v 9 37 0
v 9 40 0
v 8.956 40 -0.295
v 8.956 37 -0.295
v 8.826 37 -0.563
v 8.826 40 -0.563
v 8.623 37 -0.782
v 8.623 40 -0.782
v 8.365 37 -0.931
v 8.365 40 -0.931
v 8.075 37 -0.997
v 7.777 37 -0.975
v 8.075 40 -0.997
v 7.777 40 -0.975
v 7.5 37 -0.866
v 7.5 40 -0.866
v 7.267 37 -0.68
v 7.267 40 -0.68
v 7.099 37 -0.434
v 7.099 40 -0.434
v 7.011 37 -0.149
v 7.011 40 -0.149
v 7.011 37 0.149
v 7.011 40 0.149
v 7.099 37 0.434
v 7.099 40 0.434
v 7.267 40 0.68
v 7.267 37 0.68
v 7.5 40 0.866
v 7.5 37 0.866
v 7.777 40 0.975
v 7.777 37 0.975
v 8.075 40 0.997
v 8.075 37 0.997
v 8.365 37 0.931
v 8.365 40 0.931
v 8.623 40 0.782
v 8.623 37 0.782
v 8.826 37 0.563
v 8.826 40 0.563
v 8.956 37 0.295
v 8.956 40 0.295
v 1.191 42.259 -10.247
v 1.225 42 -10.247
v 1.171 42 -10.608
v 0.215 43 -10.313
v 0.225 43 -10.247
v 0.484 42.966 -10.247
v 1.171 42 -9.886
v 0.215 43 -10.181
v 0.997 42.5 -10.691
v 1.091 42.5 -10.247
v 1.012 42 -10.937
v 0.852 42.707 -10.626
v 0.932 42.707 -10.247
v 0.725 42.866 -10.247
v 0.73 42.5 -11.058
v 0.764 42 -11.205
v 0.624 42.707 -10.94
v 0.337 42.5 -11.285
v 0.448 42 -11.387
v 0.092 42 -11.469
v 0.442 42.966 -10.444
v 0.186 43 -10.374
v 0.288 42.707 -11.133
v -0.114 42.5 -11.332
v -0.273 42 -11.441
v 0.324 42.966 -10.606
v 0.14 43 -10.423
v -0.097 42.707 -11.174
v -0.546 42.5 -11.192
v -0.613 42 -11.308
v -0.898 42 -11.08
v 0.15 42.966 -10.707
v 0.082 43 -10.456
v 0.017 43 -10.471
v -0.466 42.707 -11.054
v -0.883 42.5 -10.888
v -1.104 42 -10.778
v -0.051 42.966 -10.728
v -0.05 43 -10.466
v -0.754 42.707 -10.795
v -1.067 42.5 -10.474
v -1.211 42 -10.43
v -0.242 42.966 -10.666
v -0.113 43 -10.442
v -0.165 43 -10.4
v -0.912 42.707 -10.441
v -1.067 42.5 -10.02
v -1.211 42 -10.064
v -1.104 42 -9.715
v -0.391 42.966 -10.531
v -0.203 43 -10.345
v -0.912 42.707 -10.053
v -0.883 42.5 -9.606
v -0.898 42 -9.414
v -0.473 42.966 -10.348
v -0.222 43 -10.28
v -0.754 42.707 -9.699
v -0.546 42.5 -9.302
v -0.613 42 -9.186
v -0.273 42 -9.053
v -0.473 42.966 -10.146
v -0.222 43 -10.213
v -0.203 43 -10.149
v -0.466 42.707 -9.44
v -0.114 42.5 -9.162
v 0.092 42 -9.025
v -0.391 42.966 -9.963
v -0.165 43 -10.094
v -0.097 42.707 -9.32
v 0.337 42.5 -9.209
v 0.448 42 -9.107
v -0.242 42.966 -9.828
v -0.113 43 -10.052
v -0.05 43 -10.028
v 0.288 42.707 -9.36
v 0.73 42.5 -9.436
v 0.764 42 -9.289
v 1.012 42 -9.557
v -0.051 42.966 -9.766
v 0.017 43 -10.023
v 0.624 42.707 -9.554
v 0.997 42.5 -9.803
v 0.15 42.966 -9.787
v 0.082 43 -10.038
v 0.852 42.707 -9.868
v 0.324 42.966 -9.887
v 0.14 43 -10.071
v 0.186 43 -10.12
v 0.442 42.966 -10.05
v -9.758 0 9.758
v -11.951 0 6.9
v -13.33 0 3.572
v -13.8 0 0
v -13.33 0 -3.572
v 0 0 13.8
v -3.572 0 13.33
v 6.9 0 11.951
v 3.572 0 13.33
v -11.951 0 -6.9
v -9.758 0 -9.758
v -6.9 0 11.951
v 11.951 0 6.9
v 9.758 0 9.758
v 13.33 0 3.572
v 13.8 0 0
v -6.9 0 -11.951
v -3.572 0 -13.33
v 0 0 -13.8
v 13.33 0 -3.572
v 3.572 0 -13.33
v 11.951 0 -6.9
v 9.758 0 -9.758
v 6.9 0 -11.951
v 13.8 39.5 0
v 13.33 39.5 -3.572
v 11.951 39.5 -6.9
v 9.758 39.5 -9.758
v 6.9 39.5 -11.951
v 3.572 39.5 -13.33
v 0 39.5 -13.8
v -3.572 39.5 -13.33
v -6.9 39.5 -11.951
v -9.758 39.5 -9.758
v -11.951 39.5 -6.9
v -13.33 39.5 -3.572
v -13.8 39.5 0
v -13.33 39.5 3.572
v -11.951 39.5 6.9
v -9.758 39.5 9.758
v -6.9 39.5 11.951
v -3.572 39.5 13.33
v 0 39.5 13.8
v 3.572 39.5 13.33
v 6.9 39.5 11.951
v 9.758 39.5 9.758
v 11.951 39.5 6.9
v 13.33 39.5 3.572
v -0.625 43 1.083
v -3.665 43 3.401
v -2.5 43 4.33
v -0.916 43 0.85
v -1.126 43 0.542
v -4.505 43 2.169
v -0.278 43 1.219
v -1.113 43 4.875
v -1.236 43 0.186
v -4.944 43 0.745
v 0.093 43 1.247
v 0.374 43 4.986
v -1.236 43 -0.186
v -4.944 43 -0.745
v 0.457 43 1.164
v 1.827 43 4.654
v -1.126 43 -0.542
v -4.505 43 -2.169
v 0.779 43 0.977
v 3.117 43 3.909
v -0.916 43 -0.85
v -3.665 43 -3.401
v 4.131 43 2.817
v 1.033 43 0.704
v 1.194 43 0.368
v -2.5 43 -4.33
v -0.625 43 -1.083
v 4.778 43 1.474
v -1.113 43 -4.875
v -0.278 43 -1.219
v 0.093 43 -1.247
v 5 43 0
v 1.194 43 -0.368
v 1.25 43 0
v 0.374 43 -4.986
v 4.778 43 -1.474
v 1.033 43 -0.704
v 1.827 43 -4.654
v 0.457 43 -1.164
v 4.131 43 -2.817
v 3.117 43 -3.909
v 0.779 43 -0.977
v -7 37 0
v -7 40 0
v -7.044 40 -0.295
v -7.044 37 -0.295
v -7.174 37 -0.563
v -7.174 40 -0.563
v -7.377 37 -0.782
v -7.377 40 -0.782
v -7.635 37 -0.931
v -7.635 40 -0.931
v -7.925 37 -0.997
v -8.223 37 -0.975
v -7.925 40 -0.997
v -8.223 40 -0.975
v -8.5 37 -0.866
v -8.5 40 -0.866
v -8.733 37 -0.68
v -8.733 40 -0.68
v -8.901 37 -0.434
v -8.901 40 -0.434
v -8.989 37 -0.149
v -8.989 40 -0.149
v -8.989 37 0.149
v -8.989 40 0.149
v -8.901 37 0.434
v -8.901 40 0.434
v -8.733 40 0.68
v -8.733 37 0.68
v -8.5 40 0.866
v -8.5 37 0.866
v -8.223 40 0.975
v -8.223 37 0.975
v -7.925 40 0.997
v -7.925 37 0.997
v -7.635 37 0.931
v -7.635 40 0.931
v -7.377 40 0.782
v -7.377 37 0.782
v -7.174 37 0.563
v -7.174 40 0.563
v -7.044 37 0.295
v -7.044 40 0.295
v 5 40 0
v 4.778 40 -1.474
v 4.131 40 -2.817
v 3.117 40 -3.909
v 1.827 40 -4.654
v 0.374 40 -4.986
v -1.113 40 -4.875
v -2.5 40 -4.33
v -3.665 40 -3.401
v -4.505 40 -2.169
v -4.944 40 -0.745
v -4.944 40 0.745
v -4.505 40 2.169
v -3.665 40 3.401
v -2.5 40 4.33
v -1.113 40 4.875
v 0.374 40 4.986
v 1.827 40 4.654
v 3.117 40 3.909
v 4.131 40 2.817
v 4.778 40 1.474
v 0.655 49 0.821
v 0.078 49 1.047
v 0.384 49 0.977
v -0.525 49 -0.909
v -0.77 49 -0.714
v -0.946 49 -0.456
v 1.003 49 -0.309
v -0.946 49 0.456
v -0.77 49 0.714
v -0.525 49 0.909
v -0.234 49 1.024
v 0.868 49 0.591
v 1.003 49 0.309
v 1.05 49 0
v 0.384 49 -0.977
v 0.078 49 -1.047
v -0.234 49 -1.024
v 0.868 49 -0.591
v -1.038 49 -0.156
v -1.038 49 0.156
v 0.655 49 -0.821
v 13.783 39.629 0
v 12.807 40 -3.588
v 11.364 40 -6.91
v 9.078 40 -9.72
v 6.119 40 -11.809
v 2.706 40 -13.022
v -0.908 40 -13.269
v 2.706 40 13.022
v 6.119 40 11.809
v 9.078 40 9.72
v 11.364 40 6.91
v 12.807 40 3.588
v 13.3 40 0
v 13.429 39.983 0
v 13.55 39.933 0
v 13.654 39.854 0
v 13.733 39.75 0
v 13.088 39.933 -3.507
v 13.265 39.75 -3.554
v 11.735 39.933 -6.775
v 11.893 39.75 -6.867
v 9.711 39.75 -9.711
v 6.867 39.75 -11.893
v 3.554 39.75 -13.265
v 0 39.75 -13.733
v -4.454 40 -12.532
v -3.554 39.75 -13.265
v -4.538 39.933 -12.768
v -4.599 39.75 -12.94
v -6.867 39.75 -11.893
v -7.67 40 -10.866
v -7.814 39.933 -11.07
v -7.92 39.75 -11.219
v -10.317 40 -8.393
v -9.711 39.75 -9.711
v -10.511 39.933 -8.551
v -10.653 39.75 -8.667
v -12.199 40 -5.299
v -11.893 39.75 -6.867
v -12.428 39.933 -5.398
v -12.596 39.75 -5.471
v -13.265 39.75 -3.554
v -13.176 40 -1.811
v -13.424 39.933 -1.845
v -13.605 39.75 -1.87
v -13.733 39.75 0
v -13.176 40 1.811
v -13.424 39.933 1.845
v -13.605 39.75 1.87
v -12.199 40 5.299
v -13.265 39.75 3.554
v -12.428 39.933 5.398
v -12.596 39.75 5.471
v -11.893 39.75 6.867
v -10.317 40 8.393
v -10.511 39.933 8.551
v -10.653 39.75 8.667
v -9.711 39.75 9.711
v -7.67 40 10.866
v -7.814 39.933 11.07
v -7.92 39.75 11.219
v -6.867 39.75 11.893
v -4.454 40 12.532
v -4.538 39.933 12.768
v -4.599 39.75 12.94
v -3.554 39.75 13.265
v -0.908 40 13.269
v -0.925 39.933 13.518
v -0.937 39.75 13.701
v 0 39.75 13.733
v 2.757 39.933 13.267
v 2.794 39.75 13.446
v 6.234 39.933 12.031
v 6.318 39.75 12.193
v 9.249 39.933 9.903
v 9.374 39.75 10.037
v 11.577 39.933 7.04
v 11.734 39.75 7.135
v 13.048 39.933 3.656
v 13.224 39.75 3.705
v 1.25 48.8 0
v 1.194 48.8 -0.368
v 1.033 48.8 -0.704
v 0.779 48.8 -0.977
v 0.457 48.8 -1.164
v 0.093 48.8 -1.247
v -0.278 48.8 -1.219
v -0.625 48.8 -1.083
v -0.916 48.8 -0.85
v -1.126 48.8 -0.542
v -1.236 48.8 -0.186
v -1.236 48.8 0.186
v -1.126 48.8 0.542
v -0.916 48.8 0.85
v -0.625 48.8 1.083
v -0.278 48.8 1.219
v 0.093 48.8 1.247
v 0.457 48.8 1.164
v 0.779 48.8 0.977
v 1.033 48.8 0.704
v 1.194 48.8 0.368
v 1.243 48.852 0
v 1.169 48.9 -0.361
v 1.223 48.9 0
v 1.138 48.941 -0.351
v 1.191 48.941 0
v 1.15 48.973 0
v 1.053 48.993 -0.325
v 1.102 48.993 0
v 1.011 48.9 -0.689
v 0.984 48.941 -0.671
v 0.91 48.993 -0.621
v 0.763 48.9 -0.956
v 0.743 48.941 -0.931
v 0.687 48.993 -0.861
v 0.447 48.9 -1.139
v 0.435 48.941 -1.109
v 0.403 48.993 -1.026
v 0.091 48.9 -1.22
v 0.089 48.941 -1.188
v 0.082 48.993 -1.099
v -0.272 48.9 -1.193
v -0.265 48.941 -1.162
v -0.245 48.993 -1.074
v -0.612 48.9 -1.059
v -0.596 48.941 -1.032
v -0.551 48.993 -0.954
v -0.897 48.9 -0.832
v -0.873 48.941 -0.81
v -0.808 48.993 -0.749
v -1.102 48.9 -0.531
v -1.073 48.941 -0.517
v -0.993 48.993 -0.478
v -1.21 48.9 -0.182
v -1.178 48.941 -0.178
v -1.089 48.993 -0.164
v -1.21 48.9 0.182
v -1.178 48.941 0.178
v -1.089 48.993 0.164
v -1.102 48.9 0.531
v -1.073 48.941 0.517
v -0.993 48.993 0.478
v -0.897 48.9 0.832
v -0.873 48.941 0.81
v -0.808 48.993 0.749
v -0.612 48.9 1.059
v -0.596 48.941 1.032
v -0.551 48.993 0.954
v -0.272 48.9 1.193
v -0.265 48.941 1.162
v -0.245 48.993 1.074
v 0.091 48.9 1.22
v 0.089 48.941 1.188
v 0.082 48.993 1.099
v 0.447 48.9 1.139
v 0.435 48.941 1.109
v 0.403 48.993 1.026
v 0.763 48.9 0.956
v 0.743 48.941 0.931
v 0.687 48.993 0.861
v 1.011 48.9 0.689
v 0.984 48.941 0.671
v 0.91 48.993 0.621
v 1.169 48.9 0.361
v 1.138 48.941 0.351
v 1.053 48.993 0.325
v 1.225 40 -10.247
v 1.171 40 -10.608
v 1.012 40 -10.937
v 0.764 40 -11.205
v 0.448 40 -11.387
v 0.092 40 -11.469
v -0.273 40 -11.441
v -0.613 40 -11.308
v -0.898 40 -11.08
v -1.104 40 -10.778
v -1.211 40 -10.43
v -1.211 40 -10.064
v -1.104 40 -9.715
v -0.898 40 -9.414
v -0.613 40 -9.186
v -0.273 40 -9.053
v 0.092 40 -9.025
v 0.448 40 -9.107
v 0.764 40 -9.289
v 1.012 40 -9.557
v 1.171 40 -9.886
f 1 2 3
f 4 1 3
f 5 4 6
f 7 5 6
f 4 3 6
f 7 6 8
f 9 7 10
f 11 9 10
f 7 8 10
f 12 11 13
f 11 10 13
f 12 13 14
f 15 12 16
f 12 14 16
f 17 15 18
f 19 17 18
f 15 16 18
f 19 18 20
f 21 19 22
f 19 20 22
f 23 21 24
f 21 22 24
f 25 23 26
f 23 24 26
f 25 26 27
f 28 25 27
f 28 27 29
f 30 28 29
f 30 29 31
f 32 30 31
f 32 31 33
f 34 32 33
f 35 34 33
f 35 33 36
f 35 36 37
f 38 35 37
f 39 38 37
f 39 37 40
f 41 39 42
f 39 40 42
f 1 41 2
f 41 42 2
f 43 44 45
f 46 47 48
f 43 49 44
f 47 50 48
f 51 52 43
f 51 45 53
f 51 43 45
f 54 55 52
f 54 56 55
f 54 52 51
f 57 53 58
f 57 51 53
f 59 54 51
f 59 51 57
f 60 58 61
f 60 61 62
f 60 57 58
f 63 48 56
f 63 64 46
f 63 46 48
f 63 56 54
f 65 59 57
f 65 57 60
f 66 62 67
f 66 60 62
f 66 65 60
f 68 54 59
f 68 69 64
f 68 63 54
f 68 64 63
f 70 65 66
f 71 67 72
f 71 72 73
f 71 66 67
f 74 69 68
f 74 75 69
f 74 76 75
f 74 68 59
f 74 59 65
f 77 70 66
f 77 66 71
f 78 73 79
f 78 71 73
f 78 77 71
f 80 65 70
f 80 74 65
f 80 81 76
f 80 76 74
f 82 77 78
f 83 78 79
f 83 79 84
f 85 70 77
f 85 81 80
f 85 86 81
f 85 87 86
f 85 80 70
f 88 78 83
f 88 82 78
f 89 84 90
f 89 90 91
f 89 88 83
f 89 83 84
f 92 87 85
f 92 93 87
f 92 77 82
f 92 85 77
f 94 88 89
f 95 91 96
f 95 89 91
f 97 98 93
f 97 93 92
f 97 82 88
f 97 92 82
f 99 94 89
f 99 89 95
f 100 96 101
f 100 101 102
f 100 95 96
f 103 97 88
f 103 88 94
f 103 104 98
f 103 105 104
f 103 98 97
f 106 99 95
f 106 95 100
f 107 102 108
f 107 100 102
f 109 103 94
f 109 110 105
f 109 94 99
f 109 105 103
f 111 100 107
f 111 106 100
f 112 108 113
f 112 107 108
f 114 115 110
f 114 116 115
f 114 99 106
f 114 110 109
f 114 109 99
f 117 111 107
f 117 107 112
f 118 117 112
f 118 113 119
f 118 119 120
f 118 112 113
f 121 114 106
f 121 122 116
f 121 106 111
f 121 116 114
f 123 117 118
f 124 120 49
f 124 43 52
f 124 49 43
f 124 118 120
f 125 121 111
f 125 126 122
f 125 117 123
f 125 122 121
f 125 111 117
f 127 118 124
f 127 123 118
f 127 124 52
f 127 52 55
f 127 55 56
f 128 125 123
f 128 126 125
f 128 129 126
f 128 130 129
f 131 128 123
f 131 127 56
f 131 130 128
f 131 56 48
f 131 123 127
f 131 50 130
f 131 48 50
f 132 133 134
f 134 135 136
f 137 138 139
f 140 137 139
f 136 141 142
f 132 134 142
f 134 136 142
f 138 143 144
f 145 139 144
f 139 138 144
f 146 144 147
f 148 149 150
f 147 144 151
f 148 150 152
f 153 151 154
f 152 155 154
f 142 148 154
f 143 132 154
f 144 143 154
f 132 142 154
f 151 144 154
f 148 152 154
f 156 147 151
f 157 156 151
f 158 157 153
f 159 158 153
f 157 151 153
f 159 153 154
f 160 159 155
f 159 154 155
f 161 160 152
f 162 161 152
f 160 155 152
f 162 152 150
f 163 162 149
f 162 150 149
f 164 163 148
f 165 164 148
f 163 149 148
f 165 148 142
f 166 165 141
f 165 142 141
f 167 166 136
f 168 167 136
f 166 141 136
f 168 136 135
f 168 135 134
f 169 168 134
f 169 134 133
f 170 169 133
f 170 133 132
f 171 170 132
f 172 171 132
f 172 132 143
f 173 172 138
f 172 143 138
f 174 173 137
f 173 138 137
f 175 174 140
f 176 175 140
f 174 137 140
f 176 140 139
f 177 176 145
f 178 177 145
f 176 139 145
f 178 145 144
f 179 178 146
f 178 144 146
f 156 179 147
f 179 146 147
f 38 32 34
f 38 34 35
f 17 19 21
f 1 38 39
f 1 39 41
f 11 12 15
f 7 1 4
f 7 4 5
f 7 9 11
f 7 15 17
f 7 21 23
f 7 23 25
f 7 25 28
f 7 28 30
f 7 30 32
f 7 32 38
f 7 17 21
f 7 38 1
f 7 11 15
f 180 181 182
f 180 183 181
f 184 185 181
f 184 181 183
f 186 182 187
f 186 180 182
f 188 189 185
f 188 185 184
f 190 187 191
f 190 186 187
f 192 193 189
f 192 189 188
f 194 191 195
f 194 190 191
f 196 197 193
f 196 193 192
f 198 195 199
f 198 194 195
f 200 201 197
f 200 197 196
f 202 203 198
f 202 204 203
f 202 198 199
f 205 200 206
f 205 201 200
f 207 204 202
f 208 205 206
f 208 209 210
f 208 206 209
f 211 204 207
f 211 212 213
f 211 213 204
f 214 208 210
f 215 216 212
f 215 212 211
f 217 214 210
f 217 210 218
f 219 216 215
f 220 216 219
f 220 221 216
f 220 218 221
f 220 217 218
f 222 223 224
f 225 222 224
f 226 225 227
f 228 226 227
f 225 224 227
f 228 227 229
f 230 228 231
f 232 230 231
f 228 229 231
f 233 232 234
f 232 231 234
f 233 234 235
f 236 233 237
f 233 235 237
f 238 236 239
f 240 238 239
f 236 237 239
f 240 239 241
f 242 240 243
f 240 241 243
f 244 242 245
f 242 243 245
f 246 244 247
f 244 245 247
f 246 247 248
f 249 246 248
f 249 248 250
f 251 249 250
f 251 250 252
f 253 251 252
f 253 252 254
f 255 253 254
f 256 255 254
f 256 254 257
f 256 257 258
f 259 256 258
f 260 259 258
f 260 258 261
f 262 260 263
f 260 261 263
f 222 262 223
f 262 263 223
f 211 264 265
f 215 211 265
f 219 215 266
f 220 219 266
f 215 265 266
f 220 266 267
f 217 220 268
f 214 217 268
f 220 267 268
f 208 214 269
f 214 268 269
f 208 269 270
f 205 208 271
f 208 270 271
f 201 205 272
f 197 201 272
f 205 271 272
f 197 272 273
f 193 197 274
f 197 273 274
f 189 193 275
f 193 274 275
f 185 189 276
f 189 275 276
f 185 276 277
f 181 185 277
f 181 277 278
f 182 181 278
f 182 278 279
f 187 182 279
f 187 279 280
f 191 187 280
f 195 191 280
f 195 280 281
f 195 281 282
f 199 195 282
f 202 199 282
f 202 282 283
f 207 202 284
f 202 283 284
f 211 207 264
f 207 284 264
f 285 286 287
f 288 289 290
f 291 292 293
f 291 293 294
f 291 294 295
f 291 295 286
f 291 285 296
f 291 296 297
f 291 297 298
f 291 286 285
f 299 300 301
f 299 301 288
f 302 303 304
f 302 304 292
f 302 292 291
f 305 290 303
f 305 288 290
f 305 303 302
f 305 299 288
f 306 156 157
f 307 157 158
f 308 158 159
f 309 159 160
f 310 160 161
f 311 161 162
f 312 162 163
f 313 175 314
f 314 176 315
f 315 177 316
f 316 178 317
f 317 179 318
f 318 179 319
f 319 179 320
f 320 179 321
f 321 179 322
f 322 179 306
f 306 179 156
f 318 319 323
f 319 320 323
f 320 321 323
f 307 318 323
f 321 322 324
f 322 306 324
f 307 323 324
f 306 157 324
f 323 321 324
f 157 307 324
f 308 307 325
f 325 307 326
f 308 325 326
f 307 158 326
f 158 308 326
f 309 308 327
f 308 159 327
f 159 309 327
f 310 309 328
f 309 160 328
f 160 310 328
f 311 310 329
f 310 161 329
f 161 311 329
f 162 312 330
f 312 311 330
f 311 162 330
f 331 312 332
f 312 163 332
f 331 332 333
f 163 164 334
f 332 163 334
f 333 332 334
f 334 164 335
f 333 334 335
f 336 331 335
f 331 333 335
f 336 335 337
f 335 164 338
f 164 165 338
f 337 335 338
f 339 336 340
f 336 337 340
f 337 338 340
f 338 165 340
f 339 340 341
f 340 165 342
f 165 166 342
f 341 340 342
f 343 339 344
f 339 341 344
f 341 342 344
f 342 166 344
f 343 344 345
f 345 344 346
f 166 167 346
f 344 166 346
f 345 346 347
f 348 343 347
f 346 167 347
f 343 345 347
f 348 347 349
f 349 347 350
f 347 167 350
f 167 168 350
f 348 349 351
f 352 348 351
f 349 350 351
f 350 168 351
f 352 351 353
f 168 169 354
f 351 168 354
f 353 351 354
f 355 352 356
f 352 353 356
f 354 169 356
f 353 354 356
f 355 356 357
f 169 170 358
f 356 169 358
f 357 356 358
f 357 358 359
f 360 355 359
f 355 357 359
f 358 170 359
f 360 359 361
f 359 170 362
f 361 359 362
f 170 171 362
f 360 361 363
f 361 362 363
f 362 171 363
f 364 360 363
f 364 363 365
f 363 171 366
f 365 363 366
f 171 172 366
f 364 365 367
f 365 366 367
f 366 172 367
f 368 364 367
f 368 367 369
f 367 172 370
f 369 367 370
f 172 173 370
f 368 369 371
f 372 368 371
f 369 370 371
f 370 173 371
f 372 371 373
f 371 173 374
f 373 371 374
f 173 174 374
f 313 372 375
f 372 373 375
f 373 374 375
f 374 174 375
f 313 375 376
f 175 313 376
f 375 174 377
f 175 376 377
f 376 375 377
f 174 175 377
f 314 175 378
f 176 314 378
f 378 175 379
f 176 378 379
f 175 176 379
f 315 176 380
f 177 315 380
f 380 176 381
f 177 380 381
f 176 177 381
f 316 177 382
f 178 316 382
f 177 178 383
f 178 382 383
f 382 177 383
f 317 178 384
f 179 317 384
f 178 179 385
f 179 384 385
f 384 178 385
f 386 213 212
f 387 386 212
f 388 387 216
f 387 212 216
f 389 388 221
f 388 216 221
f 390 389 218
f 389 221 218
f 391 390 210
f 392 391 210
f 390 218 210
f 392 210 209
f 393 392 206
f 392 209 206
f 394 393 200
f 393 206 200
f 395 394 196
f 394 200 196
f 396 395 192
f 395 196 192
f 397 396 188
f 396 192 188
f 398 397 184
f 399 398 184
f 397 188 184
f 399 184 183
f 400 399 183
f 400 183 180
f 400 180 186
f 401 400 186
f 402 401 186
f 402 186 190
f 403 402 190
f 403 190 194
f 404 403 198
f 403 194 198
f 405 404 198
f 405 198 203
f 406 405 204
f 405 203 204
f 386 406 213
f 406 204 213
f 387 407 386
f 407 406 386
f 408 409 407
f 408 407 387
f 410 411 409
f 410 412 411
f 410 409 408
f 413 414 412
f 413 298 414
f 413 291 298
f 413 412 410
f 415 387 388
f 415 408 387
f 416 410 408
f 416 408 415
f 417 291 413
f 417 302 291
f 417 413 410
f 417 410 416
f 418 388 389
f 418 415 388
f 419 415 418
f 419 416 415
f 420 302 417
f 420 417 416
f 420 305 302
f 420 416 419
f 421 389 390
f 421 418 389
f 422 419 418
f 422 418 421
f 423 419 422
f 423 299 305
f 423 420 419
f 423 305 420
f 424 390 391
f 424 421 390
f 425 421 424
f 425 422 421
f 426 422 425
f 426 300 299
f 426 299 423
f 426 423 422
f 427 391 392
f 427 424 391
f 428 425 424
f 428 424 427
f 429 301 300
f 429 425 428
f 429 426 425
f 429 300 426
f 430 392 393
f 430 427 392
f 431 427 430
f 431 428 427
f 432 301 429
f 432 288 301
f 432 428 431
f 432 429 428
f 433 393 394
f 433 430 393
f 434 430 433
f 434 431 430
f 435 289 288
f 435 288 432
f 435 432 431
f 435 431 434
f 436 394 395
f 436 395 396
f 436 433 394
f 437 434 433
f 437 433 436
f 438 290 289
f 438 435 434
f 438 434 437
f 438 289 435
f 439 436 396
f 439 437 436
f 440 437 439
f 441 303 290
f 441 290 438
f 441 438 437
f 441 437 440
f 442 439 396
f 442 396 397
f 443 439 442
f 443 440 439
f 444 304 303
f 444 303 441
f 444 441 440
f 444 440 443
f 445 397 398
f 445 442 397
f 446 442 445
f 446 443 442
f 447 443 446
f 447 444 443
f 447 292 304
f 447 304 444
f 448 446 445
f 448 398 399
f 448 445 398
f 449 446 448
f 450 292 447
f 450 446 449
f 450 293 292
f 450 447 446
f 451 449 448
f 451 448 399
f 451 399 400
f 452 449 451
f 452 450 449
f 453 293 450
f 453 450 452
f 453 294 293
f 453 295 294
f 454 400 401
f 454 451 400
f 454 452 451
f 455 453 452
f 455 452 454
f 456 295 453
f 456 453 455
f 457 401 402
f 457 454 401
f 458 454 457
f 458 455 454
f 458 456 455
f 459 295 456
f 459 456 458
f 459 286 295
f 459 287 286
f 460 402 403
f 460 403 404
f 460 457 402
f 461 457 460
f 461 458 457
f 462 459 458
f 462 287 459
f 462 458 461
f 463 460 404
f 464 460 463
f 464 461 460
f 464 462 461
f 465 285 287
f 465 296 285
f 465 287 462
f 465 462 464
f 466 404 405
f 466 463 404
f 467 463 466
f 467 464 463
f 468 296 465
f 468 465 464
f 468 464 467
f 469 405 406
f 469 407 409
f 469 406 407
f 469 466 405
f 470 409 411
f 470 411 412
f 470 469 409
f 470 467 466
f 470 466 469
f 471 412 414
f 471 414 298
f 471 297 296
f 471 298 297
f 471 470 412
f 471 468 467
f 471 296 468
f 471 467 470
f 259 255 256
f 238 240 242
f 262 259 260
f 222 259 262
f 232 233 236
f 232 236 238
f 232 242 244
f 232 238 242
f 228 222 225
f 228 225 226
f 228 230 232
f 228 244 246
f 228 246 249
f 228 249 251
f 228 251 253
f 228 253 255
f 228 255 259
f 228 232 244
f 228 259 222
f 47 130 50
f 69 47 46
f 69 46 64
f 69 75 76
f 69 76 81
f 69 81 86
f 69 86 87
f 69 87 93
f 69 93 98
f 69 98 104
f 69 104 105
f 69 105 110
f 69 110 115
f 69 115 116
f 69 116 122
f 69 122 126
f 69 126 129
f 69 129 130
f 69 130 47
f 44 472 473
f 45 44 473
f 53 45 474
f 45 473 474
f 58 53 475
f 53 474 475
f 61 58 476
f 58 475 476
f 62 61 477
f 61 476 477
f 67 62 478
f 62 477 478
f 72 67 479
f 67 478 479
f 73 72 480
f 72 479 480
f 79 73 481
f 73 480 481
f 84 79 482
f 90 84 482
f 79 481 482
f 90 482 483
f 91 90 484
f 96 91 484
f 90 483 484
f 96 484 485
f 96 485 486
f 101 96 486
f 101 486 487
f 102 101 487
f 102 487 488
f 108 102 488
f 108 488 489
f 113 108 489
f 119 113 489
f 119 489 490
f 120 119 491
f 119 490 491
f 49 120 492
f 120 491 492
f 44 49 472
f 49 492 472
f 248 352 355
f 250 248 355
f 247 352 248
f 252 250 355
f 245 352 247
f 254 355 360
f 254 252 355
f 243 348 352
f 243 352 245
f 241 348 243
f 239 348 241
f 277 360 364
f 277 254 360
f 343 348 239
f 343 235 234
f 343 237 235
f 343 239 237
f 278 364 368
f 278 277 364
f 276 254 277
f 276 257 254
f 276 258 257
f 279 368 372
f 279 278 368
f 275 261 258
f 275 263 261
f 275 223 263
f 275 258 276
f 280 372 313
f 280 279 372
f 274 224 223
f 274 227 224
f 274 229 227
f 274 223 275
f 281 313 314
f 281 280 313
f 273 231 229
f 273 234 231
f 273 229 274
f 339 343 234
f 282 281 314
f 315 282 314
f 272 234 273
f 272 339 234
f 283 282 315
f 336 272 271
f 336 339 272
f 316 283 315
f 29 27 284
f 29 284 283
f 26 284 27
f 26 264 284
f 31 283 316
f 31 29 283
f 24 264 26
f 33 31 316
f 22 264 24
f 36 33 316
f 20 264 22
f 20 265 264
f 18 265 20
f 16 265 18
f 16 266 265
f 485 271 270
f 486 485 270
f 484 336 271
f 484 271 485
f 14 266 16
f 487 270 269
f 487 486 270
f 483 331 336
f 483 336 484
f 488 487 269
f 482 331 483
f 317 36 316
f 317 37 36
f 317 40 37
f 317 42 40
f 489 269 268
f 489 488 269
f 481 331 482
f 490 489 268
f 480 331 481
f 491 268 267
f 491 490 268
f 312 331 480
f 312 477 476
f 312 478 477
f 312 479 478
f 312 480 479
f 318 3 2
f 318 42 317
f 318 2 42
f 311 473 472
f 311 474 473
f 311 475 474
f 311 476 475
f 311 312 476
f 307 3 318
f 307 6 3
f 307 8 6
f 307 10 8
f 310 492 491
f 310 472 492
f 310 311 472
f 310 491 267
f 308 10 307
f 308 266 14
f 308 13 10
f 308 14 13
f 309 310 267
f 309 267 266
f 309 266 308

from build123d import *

# Parameters (mm, degrees)
SKETCH1_R           = 13.8
BOSS_EXTRUDE1_DEPTH = 40
SKETCH2_R           = 5
BOSS_EXTRUDE2_DEPTH = 3
SKETCH3_R           = 1
CUT_EXTRUDE1_DEPTH  = 3
SKETCH4_R           = 1.225
BOSS_EXTRUDE3_DEPTH = 3
FILLET1_R           = 1
FILLET2_R           = 0.5
SKETCH5_R           = 1.25
BOSS_EXTRUDE4_DEPTH = 6
FILLET3_R           = 0.2


with BuildPart() as part:
    # Sketch1 → Boss-Extrude1 (new body)
    with BuildSketch(Plane(origin=(0, 0, 0), x_dir=(1, 0, 0), z_dir=(0, 1, 0))):
        Circle(SKETCH1_R)
    extrude(amount=BOSS_EXTRUDE1_DEPTH)

    # Sketch2 → Boss-Extrude2 (add)
    with BuildSketch(Plane(origin=(0, 40, 0), x_dir=(1, 0, 0), z_dir=(0, 1, 0))):
        Circle(SKETCH2_R)
    extrude(amount=BOSS_EXTRUDE2_DEPTH)

    # Sketch3 → Cut-Extrude1 (cut)
    with BuildSketch(Plane(origin=(0, 40, 0), x_dir=(1, 0, 0), z_dir=(0, 1, 0))):
        with Locations((-8, 0)):
            Circle(SKETCH3_R)
        with Locations((8, 0)):
            Circle(SKETCH3_R)
    extrude(amount=-CUT_EXTRUDE1_DEPTH, mode=Mode.SUBTRACT)

    # Sketch4 → Boss-Extrude3 (add)
    with BuildSketch(Plane(origin=(0, 40, 0), x_dir=(1, 0, 0), z_dir=(0, 1, 0))):
        with Locations((0, 10.246950766)):
            Circle(SKETCH4_R)
    extrude(amount=BOSS_EXTRUDE3_DEPTH)

    # Fillet1
    fillet1_edges = [part.edges().sort_by_distance(p)[0] for p in [
        (-1.225, 43, -10.246950766),
    ]]
    fillet(fillet1_edges, radius=FILLET1_R)

    # Fillet2
    fillet2_edges = [part.edges().sort_by_distance(p)[0] for p in [
        (-13.8, 40, 0),
    ]]
    fillet(fillet2_edges, radius=FILLET2_R)

    # Sketch5 → Boss-Extrude4 (add)
    with BuildSketch(Plane(origin=(0, 43, 0), x_dir=(1, 0, 0), z_dir=(0, 1, 0))):
        Circle(SKETCH5_R)
    extrude(amount=BOSS_EXTRUDE4_DEPTH)

    # Fillet3
    fillet3_edges = [part.edges().sort_by_distance(p)[0] for p in [
        (-1.25, 49, 0),
    ]]
    fillet(fillet3_edges, radius=FILLET3_R)


solid = part.part
